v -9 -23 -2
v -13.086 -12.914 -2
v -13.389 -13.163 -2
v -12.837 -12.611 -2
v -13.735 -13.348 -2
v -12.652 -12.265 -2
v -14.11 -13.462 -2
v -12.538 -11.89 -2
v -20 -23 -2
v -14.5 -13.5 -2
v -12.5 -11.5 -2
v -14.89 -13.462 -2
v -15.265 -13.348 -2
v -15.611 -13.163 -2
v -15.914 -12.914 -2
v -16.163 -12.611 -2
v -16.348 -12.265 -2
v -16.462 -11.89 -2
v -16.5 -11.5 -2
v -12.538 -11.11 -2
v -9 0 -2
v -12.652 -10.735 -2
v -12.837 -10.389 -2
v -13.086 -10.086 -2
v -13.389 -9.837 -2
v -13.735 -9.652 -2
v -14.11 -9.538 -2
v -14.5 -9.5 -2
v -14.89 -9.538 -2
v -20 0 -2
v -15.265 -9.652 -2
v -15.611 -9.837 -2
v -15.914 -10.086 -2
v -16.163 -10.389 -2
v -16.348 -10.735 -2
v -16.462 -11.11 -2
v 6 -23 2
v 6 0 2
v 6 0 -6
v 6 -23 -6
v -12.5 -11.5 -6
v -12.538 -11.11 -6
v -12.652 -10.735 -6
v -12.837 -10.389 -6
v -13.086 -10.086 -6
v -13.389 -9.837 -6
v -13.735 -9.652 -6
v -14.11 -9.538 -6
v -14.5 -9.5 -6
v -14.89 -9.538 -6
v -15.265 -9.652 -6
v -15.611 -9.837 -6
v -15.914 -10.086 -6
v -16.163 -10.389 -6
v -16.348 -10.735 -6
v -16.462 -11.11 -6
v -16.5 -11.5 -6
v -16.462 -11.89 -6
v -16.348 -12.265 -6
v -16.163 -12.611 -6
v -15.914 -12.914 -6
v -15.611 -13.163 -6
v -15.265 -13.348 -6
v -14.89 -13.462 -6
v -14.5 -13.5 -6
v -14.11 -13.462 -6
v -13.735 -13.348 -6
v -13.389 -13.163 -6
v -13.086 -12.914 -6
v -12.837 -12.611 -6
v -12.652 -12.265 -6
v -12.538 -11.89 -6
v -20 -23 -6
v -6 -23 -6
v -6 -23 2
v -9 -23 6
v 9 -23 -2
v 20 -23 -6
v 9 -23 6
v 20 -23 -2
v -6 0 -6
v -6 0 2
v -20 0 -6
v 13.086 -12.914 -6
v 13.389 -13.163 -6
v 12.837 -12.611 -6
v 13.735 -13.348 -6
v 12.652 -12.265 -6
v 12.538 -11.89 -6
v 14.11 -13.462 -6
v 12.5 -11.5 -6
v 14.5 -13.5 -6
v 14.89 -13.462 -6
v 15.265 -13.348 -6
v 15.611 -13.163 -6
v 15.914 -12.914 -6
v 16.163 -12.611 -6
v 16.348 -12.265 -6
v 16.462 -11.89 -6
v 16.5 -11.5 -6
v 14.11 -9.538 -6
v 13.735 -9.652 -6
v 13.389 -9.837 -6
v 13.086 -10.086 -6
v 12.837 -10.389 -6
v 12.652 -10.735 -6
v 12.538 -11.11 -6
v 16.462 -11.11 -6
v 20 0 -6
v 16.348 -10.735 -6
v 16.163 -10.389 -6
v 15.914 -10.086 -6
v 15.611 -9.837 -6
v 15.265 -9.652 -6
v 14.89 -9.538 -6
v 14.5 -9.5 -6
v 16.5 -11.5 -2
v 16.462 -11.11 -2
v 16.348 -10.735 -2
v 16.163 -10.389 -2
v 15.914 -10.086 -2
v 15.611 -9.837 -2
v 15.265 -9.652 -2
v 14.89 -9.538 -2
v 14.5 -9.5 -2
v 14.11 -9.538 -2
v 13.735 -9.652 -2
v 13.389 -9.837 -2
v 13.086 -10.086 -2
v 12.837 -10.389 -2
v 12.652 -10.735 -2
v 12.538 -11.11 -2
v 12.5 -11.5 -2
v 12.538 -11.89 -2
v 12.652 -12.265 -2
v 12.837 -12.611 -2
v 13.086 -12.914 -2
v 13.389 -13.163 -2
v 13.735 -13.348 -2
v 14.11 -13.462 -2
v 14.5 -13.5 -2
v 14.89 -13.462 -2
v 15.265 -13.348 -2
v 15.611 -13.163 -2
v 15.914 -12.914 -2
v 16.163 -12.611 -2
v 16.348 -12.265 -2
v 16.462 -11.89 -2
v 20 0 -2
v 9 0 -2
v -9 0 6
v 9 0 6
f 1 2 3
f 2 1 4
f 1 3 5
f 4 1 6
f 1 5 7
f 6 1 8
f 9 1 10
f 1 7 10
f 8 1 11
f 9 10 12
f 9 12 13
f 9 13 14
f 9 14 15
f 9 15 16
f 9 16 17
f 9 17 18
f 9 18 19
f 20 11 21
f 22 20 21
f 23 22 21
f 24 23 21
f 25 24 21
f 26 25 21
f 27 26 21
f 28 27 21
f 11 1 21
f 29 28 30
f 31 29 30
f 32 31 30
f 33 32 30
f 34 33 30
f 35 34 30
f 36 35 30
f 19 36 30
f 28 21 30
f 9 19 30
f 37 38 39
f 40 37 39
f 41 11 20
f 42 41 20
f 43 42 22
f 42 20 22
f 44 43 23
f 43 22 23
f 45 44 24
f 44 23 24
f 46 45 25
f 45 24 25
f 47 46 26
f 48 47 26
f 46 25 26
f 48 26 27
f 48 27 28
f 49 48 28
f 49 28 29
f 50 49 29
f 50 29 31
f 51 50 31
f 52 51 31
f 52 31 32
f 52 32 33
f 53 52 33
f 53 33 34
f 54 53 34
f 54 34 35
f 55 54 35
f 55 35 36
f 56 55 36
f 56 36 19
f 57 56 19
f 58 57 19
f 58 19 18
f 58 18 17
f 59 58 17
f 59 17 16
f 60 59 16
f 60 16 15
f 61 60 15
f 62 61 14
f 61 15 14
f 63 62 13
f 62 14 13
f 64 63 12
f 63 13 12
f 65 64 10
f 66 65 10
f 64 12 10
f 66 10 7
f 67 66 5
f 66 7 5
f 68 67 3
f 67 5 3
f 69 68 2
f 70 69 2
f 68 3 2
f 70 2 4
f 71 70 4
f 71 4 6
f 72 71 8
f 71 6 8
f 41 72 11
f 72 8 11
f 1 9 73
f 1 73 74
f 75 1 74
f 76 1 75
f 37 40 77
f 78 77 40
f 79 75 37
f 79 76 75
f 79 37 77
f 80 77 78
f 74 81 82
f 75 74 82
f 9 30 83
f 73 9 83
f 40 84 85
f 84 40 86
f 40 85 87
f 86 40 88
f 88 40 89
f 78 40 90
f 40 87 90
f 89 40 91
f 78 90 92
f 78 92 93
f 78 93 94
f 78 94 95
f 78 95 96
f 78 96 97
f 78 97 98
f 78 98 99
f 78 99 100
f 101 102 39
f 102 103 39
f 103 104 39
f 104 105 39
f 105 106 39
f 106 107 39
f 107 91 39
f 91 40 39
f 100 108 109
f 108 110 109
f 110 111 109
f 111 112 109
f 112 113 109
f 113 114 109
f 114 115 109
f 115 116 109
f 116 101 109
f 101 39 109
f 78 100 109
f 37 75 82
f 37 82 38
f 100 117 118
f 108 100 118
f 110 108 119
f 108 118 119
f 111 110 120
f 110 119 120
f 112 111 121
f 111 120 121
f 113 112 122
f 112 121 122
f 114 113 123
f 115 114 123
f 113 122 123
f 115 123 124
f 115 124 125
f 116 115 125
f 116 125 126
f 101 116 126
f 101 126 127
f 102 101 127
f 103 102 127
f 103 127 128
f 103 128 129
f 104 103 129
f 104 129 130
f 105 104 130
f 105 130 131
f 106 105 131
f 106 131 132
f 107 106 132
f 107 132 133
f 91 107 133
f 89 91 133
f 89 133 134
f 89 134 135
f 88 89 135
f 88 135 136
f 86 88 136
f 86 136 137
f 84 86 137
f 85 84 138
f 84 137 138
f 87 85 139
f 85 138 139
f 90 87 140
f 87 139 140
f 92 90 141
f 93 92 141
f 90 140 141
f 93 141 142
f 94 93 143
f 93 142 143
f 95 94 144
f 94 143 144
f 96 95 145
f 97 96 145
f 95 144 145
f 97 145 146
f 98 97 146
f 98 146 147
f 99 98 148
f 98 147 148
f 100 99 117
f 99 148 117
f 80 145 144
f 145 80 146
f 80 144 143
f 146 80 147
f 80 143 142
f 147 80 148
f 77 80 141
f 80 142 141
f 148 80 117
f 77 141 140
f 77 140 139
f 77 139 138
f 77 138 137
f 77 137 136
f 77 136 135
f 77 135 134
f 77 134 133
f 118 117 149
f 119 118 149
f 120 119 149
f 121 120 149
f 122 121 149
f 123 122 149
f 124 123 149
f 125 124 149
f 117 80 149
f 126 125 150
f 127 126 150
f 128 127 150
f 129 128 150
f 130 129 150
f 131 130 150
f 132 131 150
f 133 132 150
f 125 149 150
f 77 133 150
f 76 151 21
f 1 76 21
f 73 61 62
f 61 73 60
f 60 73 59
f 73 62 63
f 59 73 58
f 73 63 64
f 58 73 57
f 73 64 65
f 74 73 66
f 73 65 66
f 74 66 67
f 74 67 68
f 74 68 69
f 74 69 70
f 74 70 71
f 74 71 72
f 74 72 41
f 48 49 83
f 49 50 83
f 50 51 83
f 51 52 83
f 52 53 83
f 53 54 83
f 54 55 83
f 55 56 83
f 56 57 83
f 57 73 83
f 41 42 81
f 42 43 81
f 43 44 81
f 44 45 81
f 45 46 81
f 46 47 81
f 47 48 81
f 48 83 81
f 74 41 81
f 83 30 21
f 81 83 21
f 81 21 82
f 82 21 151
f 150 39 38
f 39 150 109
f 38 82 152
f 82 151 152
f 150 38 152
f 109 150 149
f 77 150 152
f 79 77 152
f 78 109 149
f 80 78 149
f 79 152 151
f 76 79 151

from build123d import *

# Parameters (mm, degrees)
F1_DEPTH = 23
F2_R     = 2
F3_DEPTH = 25


with BuildPart() as f1:
    # F0 (on Front) → F1 (new body)
    with BuildSketch(Plane.XZ):
        Polygon((20, -6), (20, -2), (9, -2), (9, 6), (8, 6), (-8, 6), (-9, 6), (-9, -2), (-20, -2), (-20, -6), (-6, -6), (-6, 0), (-6, 2), (6, 2), (6, 0), (6, -6), align=None)
    extrude(amount=F1_DEPTH)

    # F2 (on Top) → F3 (cut)
    with BuildSketch(Plane.XY):
        with Locations((-14.5, -11.5)):
            Circle(F2_R)
        with Locations((14.5, -11.5)):
            Circle(F2_R)
    extrude(amount=-F3_DEPTH, mode=Mode.SUBTRACT)


solid = f1.part
